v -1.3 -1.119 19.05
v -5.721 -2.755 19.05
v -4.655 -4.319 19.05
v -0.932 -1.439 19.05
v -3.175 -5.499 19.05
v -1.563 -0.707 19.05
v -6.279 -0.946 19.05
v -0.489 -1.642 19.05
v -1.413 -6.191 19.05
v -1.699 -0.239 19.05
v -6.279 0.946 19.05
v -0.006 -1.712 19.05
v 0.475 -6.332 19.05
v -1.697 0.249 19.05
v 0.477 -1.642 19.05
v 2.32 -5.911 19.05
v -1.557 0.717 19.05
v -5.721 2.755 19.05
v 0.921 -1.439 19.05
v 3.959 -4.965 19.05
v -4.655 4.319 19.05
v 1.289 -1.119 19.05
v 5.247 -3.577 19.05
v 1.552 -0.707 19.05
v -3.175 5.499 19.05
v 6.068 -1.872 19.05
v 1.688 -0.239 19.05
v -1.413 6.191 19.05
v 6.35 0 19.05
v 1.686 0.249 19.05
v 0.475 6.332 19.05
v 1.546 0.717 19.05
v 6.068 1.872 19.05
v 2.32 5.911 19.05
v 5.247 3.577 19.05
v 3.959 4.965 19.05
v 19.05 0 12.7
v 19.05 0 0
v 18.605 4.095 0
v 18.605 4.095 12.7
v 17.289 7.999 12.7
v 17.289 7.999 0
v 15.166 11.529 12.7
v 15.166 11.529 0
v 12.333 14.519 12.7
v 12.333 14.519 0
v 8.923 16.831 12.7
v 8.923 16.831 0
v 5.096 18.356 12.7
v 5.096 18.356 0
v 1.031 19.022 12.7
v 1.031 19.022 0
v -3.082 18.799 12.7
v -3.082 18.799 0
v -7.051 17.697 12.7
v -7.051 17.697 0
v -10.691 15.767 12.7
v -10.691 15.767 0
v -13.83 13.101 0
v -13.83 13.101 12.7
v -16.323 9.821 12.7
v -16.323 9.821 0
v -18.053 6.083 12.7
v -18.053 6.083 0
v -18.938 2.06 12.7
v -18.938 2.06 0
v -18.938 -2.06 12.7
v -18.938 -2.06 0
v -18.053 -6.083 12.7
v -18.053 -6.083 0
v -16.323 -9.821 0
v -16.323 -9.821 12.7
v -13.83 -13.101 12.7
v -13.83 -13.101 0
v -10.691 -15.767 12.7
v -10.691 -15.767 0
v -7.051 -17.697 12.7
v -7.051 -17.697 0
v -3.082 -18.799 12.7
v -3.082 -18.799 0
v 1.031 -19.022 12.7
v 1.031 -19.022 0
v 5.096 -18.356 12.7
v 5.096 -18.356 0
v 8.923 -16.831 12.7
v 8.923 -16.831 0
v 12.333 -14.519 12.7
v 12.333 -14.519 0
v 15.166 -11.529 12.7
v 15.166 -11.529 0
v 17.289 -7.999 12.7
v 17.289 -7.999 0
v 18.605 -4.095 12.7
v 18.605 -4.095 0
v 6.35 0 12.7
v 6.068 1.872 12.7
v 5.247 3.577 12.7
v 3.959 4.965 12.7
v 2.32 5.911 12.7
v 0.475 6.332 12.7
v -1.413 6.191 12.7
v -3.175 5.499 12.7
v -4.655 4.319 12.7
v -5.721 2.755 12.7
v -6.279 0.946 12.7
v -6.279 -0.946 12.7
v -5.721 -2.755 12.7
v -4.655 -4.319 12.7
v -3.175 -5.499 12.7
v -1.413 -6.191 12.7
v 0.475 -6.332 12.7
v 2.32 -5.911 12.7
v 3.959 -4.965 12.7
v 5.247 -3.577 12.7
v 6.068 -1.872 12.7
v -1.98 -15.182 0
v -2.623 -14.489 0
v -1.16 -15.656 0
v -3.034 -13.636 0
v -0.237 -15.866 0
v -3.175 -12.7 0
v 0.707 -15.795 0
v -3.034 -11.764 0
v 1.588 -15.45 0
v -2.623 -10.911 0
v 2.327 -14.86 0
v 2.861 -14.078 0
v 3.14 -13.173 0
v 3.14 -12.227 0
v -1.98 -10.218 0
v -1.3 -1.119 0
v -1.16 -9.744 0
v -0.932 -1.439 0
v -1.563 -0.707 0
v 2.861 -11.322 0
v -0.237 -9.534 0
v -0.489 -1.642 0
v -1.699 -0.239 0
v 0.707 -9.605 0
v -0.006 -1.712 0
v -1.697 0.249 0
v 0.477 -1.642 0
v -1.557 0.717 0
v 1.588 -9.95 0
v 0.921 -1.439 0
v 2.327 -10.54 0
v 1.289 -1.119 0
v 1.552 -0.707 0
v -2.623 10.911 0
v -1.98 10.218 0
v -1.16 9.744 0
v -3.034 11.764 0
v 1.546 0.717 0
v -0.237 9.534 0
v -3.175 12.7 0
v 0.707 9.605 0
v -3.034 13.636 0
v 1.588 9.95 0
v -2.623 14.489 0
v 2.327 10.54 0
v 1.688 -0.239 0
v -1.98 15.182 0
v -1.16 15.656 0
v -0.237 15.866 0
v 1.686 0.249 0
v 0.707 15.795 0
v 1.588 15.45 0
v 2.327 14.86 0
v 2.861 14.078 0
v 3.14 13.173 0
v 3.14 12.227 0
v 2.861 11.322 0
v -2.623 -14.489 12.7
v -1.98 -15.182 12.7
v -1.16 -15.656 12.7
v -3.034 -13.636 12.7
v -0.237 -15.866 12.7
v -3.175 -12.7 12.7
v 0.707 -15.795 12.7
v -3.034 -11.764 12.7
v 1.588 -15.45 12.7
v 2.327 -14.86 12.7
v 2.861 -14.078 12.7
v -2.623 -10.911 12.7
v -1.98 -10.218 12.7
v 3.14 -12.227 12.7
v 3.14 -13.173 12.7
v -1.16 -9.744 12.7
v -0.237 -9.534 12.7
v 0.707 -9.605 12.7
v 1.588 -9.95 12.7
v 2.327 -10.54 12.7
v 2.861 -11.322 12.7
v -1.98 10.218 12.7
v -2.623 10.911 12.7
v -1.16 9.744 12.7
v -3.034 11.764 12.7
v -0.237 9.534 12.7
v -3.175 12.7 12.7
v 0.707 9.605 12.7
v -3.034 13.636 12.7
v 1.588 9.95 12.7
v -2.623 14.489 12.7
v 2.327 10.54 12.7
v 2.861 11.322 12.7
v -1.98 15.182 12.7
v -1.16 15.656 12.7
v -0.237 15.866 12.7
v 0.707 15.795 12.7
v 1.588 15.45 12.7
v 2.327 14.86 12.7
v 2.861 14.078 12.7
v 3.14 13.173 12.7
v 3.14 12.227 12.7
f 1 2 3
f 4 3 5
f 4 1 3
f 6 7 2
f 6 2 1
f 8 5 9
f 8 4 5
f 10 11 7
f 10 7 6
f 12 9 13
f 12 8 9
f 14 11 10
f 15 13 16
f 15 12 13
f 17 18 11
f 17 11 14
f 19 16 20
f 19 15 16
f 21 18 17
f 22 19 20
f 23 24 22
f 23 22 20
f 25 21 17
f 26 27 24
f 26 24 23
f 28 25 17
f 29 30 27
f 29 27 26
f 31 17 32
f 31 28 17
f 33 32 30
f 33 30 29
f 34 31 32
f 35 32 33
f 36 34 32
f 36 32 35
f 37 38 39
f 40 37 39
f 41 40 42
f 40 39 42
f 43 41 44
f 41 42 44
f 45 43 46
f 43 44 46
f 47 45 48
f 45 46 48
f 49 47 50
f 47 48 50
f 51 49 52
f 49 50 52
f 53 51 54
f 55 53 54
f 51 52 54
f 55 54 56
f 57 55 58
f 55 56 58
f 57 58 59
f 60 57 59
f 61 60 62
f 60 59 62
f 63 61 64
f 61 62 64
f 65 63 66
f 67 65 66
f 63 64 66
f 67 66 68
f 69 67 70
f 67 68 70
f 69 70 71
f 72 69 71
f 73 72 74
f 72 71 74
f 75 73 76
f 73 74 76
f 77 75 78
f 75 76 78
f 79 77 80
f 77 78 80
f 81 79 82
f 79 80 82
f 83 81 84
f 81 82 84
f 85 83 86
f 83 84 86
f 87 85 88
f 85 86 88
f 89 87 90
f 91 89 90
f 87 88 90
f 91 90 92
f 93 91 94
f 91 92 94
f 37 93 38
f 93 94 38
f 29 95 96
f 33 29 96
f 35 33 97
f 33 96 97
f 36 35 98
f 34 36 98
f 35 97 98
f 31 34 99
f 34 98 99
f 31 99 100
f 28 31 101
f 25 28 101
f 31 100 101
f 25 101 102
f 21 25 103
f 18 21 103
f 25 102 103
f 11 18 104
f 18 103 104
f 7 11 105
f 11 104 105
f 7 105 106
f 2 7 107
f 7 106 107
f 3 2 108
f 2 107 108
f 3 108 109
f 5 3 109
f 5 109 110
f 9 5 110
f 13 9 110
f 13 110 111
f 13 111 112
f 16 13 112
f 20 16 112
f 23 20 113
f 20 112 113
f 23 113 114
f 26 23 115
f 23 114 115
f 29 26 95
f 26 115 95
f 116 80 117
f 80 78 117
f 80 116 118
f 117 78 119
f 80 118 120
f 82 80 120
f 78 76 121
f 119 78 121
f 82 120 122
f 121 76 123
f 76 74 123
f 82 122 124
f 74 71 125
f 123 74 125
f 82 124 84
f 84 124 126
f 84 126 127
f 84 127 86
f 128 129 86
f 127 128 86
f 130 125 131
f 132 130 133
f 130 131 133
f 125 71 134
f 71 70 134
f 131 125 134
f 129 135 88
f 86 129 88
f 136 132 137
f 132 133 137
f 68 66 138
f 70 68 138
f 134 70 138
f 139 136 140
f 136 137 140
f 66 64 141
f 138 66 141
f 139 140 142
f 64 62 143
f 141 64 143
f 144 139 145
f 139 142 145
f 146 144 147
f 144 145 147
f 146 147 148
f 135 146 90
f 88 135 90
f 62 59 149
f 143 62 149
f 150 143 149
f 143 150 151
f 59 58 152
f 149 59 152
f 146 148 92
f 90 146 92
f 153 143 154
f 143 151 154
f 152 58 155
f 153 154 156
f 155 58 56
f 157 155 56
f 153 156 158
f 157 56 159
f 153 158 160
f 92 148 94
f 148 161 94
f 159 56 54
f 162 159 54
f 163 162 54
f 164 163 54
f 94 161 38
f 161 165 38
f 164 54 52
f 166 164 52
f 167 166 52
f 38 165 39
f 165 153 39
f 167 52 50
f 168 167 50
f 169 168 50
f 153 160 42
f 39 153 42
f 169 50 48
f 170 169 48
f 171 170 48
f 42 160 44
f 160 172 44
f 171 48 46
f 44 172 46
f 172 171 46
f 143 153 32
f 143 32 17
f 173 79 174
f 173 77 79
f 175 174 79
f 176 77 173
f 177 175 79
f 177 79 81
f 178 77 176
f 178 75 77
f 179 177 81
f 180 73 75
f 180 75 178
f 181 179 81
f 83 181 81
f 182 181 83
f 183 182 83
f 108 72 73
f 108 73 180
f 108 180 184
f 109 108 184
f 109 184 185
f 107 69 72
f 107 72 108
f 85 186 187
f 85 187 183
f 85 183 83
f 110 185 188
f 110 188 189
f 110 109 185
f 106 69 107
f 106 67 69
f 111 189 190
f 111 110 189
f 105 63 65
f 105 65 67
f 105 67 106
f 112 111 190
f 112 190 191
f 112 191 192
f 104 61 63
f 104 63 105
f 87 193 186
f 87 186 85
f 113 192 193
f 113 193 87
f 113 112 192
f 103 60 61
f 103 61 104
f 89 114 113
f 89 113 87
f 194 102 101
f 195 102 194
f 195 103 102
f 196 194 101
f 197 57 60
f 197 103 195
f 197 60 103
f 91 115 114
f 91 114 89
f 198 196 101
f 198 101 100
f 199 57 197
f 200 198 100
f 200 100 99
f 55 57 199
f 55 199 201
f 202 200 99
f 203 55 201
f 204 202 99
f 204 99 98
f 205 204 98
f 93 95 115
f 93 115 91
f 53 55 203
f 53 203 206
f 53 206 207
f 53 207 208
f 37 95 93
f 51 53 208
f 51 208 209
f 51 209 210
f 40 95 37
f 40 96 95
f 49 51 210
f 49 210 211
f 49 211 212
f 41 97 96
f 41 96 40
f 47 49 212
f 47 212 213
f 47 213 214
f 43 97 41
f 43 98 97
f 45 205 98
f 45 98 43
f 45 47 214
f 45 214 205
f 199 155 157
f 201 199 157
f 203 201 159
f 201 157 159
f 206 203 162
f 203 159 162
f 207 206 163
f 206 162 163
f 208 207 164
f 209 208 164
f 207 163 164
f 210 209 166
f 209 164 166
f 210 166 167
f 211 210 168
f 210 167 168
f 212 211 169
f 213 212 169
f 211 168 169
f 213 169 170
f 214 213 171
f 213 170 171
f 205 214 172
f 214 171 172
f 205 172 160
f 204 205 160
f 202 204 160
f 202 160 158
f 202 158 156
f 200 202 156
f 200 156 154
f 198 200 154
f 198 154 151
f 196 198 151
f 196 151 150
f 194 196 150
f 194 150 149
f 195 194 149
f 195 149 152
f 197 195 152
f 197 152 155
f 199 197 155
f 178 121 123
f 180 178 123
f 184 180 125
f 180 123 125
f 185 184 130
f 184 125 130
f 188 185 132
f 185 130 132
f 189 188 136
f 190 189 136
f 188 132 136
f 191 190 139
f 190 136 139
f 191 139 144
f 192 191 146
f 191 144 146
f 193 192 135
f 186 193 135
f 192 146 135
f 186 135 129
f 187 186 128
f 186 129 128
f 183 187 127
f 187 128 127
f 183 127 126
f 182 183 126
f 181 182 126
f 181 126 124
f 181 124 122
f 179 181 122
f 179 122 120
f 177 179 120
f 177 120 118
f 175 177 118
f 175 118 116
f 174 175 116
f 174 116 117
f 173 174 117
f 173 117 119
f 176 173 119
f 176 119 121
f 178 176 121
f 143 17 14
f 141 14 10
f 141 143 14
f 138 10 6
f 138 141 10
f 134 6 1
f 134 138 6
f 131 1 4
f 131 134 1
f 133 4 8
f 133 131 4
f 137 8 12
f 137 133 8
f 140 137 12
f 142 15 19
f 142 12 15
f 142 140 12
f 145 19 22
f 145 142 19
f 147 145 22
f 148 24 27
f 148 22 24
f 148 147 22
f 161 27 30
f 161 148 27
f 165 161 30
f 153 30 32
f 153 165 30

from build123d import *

# Parameters (mm, degrees)
SKETCH1_R               = 19.05
BOSS_EXTRUDE1_DEPTH     = 12.7
SKETCH4_R               = 3.175
CUT_EXTRUDE2_DEPTH      = 13.7
CUT_EXTRUDE4_DEPTH      = 1
CUT_EXTRUDE4_DEPTH_BACK = 13.7
SKETCH7_R               = 6.35
BOSS_EXTRUDE2_DEPTH     = 6.35
CUT_EXTRUDE5_DEPTH      = 20.05


with BuildPart() as part:
    # Sketch1 → Boss-Extrude1 (new body)
    with BuildSketch(Plane.XY):
        Circle(SKETCH1_R)
    extrude(amount=BOSS_EXTRUDE1_DEPTH)

    # Sketch4 → Cut-Extrude2 (cut, through all)
    with BuildSketch(Plane(origin=(0, 0, 0), x_dir=(-1, 0, 0), z_dir=(0, 0, -1))):
        with Locations((0, 12.7)):
            Circle(SKETCH4_R)
        with Locations((0, -12.7)):
            Circle(SKETCH4_R)
    extrude(amount=-CUT_EXTRUDE2_DEPTH, mode=Mode.SUBTRACT)

    # Sketch6 → Cut-Extrude4 (cut, two sides)
    with BuildSketch(Plane.XY.offset(12.7)) as cut_extrude4_sk:
        with BuildLine():
            Line((1.546311471, 0.716838774), (0, 0.716838774))
            Line((0, 0.716838774), (-1.557372698, 0.716838774))
            ThreePointArc((-1.557372698, 0.716838774), (-0.005530614, -1.711645493), (1.546311471, 0.716838774))
        make_face()
    extrude(amount=CUT_EXTRUDE4_DEPTH, mode=Mode.SUBTRACT)
    extrude(cut_extrude4_sk.sketch, amount=-CUT_EXTRUDE4_DEPTH_BACK, mode=Mode.SUBTRACT)

    # Sketch7 → Boss-Extrude2 (add)
    with BuildSketch(Plane.XY.offset(12.7)):
        Circle(SKETCH7_R)
    extrude(amount=BOSS_EXTRUDE2_DEPTH)

    # Sketch8 → Cut-Extrude5 (cut, through all)
    with BuildSketch(Plane(origin=(0, 0, 0), x_dir=(-1, 0, 0), z_dir=(0, 0, -1))):
        with BuildLine():
            Line((-1.546311471, 0.716838774), (1.557372698, 0.716838774))
            ThreePointArc((1.557372698, 0.716838774), (0.005530614, -1.711645493), (-1.546311471, 0.716838774))
        make_face()
    extrude(amount=-CUT_EXTRUDE5_DEPTH, mode=Mode.SUBTRACT)


solid = part.part
